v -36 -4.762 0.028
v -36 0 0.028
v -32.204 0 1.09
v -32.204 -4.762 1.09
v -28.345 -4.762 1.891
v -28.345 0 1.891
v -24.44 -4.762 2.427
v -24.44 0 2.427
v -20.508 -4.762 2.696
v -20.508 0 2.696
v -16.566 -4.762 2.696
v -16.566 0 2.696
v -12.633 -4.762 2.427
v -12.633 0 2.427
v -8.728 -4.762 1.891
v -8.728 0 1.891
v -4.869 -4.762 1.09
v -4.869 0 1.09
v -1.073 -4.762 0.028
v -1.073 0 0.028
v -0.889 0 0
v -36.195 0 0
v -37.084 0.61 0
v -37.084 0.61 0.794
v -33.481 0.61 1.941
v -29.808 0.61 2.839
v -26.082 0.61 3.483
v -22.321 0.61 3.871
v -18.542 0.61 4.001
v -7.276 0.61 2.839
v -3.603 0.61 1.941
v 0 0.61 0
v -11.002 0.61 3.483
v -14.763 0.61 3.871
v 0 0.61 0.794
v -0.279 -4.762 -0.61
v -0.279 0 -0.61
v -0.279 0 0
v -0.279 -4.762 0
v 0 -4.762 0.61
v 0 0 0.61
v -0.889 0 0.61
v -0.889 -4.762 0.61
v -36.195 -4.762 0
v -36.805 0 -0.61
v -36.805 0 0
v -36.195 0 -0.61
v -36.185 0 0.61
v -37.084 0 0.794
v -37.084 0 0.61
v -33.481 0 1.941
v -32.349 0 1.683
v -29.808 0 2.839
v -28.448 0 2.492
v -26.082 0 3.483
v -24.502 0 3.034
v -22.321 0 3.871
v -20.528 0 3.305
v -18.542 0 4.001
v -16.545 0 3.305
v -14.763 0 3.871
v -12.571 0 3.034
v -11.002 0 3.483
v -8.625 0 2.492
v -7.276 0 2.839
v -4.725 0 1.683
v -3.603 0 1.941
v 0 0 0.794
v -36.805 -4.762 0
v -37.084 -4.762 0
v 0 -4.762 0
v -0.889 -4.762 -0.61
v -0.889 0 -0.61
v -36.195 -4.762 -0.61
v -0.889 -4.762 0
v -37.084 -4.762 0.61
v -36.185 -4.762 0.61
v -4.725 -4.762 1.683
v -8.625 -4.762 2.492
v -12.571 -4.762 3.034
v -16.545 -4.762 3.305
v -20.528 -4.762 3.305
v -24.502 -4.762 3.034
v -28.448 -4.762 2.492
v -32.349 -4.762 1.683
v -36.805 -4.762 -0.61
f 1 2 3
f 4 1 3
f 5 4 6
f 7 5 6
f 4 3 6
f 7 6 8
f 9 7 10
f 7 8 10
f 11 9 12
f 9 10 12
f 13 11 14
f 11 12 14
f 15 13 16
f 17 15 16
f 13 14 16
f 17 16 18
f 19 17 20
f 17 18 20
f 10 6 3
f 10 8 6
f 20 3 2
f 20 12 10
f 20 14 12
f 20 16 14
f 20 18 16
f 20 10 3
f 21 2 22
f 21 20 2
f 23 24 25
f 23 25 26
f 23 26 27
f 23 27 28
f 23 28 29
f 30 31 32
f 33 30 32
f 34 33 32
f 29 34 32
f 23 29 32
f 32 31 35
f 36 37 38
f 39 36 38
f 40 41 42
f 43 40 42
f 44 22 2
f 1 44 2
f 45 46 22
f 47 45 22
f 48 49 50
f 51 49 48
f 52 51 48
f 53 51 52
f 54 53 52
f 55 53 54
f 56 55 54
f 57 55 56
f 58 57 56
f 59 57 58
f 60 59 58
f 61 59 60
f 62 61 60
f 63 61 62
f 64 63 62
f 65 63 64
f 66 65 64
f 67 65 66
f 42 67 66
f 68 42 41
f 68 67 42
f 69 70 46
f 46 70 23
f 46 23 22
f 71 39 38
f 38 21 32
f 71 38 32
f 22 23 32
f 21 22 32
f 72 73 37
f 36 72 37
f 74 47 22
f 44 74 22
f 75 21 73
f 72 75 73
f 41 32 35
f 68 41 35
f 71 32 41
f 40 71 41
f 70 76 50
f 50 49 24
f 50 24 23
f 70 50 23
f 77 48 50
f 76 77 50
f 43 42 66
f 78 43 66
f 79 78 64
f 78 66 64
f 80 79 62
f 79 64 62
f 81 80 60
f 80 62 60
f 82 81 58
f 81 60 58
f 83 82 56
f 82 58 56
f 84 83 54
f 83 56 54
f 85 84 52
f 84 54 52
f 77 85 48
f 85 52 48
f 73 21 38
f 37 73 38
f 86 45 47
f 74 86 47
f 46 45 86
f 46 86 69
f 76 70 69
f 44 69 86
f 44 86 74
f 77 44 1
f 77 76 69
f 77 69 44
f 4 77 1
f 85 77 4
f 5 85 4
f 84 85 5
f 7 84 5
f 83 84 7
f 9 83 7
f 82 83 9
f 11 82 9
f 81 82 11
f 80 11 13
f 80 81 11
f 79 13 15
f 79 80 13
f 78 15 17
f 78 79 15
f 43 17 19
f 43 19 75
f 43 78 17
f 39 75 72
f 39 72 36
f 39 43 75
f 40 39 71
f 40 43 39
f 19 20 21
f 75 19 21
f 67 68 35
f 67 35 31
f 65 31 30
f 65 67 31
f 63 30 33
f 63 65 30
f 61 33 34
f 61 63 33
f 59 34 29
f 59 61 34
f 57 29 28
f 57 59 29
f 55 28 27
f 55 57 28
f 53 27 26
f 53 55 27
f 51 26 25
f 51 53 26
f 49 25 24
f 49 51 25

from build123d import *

# Parameters (mm, degrees)
F1_DEPTH = 0.6096
F2_W     = 0.6096
F2_H     = 0.6096
F3_DEPTH = 4.7625
F5_DEPTH = 4.7625


with BuildPart() as f1:
    # F0 (on Front) → F1 (new body)
    with BuildSketch(Plane.XZ):
        with BuildLine():
            Line((-37.084, 0), (0, 0))
            Line((0, 0), (0, 0.79375))
            ThreePointArc((0, 0.79375), (-18.542, 4.000644), (-37.084, 0.79375))
            Line((-37.084, 0.79375), (-37.084, 0))
        make_face()
    extrude(amount=-F1_DEPTH)

    # F2 (on face) → F3 (join)
    with BuildSketch(Plane.XZ):
        Polygon((-37.084, 0.6096), (-37.084, 0), (-36.8046, 0), (-36.195, 0), (-36.184512, 0.6096), align=None)
        with Locations((-36.4998, -0.3048)):
            Rectangle(F2_W, F2_H)
        with Locations((-0.5842, -0.3048)):
            Rectangle(F2_W, F2_H)
        Polygon((-0.889, 0.6096), (-0.889, 0), (-0.2794, 0), (0, 0), (0, 0.6096), align=None)
    extrude(amount=F3_DEPTH)

    # F4 (on face) → F5 (join)
    with BuildSketch(Plane.XZ):
        with BuildLine():
            Line((-0.889, 0), (-0.889, 0.6096))
            ThreePointArc((-0.889, 0.6096), (-18.536756, 3.338909), (-36.184512, 0.6096))
            Line((-36.184512, 0.6096), (-36.195, 0))
            Line((-36.195, 0), (-36.000362, 0.02848))
            ThreePointArc((-36.000362, 0.02848), (-18.536756, 2.729309), (-1.07315, 0.02848))
            Line((-1.07315, 0.02848), (-0.889, 0))
        make_face()
    extrude(amount=F5_DEPTH)


solid = f1.part
